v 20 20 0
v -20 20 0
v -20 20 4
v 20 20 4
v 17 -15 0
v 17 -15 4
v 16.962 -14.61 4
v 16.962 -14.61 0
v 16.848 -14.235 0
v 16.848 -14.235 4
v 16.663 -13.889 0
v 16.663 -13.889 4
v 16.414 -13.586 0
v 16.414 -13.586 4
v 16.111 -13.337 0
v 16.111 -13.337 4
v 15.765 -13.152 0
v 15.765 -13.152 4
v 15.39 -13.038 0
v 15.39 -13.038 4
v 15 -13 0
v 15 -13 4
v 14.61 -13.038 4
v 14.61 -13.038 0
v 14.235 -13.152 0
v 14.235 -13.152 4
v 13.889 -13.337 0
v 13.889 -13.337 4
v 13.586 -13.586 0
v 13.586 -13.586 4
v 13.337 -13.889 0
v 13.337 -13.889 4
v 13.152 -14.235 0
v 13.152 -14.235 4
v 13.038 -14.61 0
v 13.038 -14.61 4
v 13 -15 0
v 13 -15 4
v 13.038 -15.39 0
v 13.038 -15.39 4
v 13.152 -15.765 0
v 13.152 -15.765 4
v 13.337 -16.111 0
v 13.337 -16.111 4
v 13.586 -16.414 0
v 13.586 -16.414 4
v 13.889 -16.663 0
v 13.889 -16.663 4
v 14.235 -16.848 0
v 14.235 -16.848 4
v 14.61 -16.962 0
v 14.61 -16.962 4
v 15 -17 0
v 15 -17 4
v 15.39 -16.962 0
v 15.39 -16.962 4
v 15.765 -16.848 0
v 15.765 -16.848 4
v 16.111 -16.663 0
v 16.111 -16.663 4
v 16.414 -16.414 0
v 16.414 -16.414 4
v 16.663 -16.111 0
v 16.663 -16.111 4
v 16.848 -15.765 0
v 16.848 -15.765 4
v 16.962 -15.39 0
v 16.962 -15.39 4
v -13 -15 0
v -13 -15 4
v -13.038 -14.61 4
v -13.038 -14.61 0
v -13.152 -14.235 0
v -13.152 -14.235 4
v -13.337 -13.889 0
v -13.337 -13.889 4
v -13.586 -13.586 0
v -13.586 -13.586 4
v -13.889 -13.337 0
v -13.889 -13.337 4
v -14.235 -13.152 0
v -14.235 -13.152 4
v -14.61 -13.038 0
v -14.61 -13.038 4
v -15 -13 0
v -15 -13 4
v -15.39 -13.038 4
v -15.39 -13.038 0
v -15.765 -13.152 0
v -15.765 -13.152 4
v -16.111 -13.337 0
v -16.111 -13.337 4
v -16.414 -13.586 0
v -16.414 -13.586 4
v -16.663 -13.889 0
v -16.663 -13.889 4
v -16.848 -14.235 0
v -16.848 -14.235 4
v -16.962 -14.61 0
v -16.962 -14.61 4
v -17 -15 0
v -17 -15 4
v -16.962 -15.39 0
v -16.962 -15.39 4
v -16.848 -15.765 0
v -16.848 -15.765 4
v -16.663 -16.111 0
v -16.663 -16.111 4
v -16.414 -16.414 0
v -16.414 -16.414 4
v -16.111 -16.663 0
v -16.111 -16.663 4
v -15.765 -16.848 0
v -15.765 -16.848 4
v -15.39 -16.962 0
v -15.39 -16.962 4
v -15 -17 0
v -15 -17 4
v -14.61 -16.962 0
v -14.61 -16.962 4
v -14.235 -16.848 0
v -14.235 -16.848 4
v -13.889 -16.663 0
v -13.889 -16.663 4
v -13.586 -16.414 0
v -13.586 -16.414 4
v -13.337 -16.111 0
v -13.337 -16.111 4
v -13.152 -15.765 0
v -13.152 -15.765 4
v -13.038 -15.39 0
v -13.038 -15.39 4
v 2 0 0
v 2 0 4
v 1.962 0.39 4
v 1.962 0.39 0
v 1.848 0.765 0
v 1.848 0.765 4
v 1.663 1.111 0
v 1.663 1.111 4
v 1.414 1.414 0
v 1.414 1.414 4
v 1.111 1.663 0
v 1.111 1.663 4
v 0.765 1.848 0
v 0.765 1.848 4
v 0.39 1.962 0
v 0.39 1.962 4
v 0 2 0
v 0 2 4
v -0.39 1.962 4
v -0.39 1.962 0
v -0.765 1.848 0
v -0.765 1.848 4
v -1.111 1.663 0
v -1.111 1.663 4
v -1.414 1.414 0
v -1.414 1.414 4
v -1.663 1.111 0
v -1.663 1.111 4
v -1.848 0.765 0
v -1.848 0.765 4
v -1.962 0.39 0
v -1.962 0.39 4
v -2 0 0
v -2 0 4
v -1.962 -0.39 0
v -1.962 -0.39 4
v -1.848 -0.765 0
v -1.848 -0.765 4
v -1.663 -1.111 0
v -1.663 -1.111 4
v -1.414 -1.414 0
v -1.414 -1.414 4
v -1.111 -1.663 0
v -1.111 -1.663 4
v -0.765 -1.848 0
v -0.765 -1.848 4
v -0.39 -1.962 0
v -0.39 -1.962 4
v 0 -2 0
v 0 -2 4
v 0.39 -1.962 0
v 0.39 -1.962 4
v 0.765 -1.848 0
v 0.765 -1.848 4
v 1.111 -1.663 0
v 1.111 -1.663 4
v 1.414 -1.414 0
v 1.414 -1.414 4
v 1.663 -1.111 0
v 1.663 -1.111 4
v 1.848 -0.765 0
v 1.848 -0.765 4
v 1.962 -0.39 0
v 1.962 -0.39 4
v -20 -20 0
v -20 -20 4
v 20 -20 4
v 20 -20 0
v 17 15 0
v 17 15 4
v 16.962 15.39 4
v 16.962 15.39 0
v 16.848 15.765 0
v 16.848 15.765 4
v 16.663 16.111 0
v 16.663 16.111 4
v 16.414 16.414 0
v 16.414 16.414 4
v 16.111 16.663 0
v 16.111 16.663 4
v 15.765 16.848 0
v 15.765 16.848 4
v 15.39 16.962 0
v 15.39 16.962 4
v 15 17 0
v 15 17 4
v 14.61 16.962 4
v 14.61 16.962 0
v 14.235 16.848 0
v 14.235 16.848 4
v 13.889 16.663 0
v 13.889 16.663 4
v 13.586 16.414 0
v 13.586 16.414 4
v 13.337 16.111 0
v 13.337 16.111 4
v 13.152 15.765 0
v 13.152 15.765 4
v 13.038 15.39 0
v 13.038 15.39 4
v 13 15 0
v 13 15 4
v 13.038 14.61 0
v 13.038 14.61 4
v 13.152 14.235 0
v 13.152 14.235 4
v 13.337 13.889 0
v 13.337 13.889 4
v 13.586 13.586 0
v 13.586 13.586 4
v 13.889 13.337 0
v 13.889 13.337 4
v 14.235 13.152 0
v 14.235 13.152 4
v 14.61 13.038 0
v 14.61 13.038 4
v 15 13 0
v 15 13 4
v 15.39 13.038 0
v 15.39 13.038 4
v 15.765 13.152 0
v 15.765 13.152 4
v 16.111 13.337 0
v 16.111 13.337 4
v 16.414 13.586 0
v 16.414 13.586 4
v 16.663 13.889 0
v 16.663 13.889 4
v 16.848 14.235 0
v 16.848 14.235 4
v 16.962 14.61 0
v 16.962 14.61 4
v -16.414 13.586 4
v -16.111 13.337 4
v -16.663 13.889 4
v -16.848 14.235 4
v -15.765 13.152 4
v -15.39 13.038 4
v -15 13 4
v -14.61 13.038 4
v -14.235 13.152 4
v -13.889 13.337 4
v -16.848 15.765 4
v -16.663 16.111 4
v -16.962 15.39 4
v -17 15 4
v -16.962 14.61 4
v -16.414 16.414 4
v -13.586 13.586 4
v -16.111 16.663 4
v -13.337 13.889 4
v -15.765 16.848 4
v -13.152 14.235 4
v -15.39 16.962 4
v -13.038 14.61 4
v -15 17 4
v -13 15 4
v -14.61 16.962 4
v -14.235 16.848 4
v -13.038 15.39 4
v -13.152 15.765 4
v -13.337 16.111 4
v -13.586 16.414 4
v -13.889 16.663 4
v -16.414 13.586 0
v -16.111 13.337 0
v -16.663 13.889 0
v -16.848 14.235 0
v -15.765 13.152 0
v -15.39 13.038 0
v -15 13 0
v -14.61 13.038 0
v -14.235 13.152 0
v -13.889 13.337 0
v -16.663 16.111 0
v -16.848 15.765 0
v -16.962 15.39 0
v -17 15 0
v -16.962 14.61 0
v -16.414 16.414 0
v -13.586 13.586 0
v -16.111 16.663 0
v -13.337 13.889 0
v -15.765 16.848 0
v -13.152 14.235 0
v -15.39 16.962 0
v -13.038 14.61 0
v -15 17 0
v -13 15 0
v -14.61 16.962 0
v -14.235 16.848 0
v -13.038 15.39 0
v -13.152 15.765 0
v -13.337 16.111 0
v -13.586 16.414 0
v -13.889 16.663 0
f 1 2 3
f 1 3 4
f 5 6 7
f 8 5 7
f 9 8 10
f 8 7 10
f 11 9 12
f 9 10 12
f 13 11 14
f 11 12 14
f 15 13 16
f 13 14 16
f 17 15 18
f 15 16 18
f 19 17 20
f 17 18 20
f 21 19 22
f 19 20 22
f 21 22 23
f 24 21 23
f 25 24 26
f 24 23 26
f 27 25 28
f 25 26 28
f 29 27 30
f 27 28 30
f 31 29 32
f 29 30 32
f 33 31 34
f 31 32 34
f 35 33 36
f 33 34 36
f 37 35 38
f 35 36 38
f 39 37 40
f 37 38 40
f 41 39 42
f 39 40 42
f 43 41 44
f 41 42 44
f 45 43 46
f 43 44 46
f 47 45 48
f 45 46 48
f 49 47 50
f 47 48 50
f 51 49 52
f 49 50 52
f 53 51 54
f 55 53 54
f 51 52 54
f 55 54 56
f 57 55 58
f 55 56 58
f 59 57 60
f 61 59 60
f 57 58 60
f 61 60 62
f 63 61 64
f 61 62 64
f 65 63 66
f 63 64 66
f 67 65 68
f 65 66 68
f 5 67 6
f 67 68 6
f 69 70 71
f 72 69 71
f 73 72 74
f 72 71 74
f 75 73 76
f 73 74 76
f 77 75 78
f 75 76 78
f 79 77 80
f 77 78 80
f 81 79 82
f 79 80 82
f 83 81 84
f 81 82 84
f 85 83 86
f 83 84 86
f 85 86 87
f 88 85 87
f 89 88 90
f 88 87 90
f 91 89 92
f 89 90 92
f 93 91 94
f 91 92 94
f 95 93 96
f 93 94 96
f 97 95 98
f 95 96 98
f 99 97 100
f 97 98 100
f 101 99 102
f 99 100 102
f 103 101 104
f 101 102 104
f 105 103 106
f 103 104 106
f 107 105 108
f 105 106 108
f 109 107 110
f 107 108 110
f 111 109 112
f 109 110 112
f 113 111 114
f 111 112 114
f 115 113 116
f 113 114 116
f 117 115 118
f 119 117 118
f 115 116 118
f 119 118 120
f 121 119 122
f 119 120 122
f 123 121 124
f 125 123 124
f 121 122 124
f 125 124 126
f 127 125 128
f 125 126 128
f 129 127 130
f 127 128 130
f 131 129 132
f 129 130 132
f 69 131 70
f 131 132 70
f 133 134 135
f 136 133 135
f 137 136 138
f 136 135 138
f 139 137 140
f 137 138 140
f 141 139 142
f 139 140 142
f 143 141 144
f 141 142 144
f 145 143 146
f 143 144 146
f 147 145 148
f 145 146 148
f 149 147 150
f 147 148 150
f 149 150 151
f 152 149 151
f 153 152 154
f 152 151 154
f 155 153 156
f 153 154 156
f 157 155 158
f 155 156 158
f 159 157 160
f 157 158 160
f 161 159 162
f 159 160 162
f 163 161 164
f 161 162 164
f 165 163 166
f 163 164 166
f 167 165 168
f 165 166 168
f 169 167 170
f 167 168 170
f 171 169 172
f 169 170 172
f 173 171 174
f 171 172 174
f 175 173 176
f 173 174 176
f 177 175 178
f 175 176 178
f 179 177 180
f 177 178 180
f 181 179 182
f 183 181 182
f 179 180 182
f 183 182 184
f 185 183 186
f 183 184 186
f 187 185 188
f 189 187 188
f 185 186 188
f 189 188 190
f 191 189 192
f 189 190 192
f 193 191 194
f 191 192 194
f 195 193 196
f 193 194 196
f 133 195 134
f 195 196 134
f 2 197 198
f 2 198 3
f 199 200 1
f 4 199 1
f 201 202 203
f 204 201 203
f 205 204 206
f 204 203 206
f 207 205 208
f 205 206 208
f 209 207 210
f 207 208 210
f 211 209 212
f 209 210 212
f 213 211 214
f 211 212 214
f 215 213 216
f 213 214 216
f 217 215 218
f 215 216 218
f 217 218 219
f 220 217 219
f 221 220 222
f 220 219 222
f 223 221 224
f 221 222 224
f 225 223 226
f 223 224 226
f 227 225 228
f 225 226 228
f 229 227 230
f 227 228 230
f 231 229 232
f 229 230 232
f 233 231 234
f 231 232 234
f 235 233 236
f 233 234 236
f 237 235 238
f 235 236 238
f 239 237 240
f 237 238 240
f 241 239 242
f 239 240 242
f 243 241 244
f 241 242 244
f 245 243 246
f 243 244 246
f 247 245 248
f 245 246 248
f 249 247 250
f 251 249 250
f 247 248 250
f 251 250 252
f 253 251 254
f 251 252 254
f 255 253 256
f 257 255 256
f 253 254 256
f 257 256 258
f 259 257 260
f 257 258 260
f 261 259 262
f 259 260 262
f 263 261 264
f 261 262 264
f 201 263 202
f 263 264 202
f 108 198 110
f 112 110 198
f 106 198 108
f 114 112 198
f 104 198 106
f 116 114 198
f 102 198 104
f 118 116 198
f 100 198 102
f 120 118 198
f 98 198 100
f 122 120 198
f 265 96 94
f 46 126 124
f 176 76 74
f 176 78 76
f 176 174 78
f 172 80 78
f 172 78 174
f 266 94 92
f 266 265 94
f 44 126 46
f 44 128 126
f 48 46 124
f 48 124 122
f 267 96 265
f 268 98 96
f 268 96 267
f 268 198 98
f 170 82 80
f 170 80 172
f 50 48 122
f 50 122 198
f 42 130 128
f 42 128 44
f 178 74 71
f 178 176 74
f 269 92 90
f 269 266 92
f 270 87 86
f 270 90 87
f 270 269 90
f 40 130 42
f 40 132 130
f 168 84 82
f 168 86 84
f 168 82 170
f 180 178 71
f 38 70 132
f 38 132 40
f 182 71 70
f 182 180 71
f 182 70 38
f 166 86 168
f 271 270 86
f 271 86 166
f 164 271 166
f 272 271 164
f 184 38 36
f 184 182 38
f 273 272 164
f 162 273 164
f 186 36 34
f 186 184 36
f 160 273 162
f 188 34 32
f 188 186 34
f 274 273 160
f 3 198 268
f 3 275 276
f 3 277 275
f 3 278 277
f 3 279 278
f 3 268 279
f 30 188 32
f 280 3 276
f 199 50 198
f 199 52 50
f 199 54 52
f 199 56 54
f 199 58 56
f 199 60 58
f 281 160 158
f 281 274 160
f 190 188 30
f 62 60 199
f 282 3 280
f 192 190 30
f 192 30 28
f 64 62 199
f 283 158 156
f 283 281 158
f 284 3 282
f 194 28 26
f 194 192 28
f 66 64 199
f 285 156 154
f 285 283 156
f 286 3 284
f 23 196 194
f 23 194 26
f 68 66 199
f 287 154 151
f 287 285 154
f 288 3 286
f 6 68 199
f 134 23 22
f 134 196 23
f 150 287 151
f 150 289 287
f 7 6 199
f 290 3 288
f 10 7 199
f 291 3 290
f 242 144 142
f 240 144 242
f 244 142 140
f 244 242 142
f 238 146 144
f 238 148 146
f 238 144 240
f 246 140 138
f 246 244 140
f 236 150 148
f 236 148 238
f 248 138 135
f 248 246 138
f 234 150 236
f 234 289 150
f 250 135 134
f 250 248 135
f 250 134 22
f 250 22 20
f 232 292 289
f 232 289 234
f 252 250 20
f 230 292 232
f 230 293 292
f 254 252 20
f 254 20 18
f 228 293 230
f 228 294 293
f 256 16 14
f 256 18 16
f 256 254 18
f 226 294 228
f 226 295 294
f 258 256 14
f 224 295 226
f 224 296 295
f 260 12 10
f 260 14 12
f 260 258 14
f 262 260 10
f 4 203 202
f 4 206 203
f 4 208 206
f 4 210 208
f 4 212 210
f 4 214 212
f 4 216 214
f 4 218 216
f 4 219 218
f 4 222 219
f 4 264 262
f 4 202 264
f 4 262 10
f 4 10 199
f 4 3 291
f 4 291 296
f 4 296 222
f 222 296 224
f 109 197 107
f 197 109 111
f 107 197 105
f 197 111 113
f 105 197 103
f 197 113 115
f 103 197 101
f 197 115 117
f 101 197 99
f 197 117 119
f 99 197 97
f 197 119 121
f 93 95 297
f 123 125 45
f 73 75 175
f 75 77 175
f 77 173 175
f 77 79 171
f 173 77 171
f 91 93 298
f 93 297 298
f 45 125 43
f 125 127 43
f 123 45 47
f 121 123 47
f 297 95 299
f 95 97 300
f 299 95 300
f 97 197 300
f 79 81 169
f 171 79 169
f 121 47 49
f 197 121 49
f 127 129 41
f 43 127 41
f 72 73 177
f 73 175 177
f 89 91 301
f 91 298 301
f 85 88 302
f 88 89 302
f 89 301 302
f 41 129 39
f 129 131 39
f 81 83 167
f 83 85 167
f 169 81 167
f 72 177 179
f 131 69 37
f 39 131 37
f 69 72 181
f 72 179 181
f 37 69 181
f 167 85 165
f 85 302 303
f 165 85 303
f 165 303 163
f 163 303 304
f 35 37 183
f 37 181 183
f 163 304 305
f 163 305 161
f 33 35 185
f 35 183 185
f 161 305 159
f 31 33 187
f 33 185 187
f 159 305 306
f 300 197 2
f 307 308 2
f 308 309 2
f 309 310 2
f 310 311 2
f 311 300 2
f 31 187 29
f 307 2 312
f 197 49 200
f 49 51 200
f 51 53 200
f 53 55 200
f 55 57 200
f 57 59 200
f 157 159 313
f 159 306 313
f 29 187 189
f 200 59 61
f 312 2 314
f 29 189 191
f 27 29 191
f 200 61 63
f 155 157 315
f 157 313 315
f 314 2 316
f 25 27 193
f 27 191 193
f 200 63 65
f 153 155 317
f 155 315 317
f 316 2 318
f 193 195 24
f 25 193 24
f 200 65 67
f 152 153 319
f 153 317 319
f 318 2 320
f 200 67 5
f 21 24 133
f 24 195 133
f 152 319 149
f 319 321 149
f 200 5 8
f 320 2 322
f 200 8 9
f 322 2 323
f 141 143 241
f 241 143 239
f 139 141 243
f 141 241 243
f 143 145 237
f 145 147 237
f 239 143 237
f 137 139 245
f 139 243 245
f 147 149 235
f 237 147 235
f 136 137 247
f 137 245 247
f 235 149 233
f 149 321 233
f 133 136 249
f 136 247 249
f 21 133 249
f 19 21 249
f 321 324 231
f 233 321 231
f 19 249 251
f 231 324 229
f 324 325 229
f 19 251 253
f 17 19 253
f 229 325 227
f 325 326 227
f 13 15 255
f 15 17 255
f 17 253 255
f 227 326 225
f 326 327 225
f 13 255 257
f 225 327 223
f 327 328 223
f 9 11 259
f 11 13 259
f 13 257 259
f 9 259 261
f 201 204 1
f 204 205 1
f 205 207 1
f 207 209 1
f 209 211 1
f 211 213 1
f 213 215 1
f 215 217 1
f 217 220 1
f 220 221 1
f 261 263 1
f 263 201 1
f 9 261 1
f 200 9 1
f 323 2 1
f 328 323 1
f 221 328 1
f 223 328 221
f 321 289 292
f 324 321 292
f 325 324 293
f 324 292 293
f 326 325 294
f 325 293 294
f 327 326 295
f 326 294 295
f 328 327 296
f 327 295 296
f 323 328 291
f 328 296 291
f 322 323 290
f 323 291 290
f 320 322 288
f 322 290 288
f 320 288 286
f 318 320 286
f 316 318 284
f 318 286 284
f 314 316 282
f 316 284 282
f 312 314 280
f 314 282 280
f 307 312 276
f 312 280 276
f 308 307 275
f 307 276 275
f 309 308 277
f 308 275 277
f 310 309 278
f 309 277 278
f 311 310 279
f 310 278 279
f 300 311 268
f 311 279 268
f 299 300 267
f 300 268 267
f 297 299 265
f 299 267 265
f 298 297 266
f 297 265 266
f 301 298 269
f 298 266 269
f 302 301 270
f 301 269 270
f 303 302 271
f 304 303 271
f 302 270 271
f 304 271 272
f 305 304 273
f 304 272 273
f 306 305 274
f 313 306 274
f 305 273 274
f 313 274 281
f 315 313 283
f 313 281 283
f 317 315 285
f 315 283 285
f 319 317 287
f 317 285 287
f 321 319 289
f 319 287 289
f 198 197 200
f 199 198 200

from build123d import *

# Parameters (mm, degrees)
SKETCH1_W           = 40
SKETCH1_H           = 40
BOSS_EXTRUDE1_DEPTH = 4
SKETCH2_R           = 2
CUT_EXTRUDE1_DEPTH  = 4
SKETCH3_R           = 2
CUT_EXTRUDE2_DEPTH  = 4


with BuildPart() as part:
    # Sketch1 → Boss-Extrude1 (new body)
    with BuildSketch(Plane.XY):
        Rectangle(SKETCH1_W, SKETCH1_H)
    extrude(amount=BOSS_EXTRUDE1_DEPTH)

    # Sketch2 → Cut-Extrude1 (cut)
    with BuildSketch(Plane.XY.offset(4)):
        with Locations((-15, 15)):
            Circle(SKETCH2_R)
        with Locations((15, 15)):
            Circle(SKETCH2_R)
        with Locations((15, -15)):
            Circle(SKETCH2_R)
        with Locations((-15, -15)):
            Circle(SKETCH2_R)
    extrude(amount=-CUT_EXTRUDE1_DEPTH, mode=Mode.SUBTRACT)

    # Sketch3 → Cut-Extrude2 (cut)
    with BuildSketch(Plane.XY.offset(4)):
        Circle(SKETCH3_R)
    extrude(amount=-CUT_EXTRUDE2_DEPTH, mode=Mode.SUBTRACT)


solid = part.part
